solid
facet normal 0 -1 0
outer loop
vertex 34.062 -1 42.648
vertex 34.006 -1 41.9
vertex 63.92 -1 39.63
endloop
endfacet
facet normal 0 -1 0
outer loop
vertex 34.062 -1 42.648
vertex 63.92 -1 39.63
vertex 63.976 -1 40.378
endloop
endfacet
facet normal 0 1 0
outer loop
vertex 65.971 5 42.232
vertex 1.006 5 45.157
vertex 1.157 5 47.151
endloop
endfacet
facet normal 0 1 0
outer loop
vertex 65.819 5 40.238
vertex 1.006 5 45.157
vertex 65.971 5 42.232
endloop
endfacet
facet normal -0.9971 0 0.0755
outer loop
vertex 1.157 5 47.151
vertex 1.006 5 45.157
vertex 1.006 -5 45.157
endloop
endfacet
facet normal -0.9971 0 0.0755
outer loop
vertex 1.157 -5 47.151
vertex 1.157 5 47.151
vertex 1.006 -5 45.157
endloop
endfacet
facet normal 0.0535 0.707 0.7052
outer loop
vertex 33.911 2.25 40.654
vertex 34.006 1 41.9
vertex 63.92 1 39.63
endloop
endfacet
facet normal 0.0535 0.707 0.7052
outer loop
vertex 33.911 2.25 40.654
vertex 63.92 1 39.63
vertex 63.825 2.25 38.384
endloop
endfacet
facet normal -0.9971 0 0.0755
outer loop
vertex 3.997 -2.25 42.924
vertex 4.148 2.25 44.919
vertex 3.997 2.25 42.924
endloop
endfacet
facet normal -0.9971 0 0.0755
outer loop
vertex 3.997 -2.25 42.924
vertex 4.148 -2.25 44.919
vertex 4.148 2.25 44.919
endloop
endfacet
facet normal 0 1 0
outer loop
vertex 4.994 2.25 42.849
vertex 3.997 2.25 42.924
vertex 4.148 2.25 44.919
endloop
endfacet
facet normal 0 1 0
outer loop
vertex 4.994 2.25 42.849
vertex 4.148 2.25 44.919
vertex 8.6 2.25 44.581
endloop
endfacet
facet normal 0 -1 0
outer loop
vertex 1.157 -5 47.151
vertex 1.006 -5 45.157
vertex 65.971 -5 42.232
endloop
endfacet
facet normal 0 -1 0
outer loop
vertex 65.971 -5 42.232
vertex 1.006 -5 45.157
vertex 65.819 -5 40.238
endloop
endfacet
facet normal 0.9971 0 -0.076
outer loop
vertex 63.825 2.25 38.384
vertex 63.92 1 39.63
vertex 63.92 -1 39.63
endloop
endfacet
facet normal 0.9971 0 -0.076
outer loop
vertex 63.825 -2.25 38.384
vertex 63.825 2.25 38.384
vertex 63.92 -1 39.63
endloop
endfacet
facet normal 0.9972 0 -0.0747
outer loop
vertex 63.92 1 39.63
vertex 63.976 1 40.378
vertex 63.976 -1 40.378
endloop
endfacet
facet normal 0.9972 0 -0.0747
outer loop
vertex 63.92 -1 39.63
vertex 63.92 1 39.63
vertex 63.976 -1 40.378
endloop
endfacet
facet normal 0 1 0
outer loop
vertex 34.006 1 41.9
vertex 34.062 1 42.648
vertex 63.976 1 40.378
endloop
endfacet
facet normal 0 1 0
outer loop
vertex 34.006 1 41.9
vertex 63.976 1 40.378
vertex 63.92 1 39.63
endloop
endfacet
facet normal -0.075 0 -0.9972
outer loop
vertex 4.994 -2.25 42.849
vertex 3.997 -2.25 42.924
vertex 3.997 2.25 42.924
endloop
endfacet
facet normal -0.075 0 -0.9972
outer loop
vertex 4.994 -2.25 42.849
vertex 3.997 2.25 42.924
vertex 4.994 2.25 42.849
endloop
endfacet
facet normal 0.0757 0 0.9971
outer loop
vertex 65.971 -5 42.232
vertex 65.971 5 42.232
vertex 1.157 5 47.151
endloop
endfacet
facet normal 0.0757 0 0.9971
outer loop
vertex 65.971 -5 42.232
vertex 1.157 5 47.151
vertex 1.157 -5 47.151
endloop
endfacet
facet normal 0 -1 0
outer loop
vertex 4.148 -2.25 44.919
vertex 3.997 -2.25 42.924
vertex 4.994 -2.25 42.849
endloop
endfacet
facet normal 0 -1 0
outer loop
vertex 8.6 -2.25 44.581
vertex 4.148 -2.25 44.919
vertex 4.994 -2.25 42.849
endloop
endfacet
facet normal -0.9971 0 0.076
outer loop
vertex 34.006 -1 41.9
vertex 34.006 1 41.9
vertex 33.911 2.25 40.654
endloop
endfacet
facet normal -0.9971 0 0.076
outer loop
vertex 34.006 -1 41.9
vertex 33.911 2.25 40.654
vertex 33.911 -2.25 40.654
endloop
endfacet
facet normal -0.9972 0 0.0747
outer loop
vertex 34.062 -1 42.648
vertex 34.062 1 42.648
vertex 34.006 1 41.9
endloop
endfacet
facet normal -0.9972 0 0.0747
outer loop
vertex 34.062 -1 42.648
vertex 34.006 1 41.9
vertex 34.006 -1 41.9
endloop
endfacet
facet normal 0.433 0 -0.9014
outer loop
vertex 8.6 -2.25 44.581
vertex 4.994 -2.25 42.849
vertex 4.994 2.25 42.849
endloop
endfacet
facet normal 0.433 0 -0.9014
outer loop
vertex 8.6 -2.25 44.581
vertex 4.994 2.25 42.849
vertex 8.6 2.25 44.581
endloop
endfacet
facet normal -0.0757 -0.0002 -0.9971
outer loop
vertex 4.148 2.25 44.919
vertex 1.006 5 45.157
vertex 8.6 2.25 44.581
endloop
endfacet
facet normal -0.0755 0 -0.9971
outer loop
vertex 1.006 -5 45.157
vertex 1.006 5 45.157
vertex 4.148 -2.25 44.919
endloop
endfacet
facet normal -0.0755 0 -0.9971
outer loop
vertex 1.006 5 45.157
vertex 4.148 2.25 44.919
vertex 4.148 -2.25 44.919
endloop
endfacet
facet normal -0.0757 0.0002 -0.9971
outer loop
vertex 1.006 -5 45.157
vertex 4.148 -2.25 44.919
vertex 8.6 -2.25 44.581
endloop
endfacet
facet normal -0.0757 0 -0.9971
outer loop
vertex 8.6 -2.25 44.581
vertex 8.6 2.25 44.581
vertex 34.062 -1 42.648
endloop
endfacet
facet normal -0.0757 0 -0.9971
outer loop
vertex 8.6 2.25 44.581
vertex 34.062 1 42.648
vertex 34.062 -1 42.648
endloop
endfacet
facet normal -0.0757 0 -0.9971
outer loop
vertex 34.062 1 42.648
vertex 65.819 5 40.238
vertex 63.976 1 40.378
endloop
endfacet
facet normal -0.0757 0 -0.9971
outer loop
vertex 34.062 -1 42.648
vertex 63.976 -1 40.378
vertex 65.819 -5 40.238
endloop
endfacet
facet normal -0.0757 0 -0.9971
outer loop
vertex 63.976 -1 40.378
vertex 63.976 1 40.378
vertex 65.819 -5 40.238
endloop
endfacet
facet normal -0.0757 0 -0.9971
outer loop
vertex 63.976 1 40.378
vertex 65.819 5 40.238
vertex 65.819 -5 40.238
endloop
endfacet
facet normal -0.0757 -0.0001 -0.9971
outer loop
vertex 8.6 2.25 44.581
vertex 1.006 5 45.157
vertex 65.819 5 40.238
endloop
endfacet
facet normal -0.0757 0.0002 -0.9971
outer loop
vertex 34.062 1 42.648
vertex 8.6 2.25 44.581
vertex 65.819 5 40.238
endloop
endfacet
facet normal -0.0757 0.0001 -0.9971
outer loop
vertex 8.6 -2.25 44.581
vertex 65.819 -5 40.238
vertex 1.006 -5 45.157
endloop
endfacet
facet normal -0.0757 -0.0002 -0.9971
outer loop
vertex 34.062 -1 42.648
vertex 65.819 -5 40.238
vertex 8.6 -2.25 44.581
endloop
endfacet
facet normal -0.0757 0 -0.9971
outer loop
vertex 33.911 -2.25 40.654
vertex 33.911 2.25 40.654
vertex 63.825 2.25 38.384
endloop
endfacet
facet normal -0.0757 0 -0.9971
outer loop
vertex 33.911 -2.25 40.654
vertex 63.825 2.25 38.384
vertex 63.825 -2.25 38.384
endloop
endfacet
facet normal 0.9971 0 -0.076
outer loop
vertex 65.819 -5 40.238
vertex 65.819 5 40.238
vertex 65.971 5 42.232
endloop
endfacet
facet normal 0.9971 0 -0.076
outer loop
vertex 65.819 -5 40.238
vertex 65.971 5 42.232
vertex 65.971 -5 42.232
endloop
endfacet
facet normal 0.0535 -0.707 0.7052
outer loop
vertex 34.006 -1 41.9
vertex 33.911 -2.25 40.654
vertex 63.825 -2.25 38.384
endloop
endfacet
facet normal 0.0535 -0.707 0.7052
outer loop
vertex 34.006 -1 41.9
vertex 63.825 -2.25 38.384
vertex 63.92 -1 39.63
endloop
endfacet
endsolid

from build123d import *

# Parameters (mm, degrees)
PAD001_DEPTH        = 30
SKETCH002_W         = 10
SKETCH002_H         = 65
PAD002_DEPTH        = 2
PAD003_DEPTH        = 2.25
BODY001_PITCH_ANGLE = 4.34


with BuildPart() as part:
    # Sketch001 (on DatumPlane) → Pad001 (new body)
    with BuildSketch(Plane.YZ.offset(31)):
        Polygon((-1, 2), (1, 2), (1, 1.25), (2.25, 0), (-2.25, 0), (-1, 1.25), align=None)
    extrude(amount=PAD001_DEPTH)

    # Sketch002 (on DatumPlane) → Pad002 (join)
    with BuildSketch(Plane(origin=(31, 0, 2), x_dir=(0, -1, 0), z_dir=(0, 0, 1))):
        with Locations((0, -0.65176)):
            Rectangle(SKETCH002_W, SKETCH002_H)
    extrude(amount=PAD002_DEPTH)

    # Sketch003 (on DatumPlane) → Pad003 (join, symmetric)
    with BuildSketch(Plane.XZ):
        Polygon((1, 2), (1, 0), (2, 0), (5.464102, 2), align=None)
    extrude(amount=PAD003_DEPTH, both=True)


with BuildPart() as part_1:
    # Body001 pitch: moved
    add(part.part.rotate(Axis((0, 0, 0), (0, 1, 0)), BODY001_PITCH_ANGLE))


with BuildPart() as part_2:
    # Body001 placement: moved
    add(part_1.part.moved(Location((3, 0, 43))))


solid = part_2.part
